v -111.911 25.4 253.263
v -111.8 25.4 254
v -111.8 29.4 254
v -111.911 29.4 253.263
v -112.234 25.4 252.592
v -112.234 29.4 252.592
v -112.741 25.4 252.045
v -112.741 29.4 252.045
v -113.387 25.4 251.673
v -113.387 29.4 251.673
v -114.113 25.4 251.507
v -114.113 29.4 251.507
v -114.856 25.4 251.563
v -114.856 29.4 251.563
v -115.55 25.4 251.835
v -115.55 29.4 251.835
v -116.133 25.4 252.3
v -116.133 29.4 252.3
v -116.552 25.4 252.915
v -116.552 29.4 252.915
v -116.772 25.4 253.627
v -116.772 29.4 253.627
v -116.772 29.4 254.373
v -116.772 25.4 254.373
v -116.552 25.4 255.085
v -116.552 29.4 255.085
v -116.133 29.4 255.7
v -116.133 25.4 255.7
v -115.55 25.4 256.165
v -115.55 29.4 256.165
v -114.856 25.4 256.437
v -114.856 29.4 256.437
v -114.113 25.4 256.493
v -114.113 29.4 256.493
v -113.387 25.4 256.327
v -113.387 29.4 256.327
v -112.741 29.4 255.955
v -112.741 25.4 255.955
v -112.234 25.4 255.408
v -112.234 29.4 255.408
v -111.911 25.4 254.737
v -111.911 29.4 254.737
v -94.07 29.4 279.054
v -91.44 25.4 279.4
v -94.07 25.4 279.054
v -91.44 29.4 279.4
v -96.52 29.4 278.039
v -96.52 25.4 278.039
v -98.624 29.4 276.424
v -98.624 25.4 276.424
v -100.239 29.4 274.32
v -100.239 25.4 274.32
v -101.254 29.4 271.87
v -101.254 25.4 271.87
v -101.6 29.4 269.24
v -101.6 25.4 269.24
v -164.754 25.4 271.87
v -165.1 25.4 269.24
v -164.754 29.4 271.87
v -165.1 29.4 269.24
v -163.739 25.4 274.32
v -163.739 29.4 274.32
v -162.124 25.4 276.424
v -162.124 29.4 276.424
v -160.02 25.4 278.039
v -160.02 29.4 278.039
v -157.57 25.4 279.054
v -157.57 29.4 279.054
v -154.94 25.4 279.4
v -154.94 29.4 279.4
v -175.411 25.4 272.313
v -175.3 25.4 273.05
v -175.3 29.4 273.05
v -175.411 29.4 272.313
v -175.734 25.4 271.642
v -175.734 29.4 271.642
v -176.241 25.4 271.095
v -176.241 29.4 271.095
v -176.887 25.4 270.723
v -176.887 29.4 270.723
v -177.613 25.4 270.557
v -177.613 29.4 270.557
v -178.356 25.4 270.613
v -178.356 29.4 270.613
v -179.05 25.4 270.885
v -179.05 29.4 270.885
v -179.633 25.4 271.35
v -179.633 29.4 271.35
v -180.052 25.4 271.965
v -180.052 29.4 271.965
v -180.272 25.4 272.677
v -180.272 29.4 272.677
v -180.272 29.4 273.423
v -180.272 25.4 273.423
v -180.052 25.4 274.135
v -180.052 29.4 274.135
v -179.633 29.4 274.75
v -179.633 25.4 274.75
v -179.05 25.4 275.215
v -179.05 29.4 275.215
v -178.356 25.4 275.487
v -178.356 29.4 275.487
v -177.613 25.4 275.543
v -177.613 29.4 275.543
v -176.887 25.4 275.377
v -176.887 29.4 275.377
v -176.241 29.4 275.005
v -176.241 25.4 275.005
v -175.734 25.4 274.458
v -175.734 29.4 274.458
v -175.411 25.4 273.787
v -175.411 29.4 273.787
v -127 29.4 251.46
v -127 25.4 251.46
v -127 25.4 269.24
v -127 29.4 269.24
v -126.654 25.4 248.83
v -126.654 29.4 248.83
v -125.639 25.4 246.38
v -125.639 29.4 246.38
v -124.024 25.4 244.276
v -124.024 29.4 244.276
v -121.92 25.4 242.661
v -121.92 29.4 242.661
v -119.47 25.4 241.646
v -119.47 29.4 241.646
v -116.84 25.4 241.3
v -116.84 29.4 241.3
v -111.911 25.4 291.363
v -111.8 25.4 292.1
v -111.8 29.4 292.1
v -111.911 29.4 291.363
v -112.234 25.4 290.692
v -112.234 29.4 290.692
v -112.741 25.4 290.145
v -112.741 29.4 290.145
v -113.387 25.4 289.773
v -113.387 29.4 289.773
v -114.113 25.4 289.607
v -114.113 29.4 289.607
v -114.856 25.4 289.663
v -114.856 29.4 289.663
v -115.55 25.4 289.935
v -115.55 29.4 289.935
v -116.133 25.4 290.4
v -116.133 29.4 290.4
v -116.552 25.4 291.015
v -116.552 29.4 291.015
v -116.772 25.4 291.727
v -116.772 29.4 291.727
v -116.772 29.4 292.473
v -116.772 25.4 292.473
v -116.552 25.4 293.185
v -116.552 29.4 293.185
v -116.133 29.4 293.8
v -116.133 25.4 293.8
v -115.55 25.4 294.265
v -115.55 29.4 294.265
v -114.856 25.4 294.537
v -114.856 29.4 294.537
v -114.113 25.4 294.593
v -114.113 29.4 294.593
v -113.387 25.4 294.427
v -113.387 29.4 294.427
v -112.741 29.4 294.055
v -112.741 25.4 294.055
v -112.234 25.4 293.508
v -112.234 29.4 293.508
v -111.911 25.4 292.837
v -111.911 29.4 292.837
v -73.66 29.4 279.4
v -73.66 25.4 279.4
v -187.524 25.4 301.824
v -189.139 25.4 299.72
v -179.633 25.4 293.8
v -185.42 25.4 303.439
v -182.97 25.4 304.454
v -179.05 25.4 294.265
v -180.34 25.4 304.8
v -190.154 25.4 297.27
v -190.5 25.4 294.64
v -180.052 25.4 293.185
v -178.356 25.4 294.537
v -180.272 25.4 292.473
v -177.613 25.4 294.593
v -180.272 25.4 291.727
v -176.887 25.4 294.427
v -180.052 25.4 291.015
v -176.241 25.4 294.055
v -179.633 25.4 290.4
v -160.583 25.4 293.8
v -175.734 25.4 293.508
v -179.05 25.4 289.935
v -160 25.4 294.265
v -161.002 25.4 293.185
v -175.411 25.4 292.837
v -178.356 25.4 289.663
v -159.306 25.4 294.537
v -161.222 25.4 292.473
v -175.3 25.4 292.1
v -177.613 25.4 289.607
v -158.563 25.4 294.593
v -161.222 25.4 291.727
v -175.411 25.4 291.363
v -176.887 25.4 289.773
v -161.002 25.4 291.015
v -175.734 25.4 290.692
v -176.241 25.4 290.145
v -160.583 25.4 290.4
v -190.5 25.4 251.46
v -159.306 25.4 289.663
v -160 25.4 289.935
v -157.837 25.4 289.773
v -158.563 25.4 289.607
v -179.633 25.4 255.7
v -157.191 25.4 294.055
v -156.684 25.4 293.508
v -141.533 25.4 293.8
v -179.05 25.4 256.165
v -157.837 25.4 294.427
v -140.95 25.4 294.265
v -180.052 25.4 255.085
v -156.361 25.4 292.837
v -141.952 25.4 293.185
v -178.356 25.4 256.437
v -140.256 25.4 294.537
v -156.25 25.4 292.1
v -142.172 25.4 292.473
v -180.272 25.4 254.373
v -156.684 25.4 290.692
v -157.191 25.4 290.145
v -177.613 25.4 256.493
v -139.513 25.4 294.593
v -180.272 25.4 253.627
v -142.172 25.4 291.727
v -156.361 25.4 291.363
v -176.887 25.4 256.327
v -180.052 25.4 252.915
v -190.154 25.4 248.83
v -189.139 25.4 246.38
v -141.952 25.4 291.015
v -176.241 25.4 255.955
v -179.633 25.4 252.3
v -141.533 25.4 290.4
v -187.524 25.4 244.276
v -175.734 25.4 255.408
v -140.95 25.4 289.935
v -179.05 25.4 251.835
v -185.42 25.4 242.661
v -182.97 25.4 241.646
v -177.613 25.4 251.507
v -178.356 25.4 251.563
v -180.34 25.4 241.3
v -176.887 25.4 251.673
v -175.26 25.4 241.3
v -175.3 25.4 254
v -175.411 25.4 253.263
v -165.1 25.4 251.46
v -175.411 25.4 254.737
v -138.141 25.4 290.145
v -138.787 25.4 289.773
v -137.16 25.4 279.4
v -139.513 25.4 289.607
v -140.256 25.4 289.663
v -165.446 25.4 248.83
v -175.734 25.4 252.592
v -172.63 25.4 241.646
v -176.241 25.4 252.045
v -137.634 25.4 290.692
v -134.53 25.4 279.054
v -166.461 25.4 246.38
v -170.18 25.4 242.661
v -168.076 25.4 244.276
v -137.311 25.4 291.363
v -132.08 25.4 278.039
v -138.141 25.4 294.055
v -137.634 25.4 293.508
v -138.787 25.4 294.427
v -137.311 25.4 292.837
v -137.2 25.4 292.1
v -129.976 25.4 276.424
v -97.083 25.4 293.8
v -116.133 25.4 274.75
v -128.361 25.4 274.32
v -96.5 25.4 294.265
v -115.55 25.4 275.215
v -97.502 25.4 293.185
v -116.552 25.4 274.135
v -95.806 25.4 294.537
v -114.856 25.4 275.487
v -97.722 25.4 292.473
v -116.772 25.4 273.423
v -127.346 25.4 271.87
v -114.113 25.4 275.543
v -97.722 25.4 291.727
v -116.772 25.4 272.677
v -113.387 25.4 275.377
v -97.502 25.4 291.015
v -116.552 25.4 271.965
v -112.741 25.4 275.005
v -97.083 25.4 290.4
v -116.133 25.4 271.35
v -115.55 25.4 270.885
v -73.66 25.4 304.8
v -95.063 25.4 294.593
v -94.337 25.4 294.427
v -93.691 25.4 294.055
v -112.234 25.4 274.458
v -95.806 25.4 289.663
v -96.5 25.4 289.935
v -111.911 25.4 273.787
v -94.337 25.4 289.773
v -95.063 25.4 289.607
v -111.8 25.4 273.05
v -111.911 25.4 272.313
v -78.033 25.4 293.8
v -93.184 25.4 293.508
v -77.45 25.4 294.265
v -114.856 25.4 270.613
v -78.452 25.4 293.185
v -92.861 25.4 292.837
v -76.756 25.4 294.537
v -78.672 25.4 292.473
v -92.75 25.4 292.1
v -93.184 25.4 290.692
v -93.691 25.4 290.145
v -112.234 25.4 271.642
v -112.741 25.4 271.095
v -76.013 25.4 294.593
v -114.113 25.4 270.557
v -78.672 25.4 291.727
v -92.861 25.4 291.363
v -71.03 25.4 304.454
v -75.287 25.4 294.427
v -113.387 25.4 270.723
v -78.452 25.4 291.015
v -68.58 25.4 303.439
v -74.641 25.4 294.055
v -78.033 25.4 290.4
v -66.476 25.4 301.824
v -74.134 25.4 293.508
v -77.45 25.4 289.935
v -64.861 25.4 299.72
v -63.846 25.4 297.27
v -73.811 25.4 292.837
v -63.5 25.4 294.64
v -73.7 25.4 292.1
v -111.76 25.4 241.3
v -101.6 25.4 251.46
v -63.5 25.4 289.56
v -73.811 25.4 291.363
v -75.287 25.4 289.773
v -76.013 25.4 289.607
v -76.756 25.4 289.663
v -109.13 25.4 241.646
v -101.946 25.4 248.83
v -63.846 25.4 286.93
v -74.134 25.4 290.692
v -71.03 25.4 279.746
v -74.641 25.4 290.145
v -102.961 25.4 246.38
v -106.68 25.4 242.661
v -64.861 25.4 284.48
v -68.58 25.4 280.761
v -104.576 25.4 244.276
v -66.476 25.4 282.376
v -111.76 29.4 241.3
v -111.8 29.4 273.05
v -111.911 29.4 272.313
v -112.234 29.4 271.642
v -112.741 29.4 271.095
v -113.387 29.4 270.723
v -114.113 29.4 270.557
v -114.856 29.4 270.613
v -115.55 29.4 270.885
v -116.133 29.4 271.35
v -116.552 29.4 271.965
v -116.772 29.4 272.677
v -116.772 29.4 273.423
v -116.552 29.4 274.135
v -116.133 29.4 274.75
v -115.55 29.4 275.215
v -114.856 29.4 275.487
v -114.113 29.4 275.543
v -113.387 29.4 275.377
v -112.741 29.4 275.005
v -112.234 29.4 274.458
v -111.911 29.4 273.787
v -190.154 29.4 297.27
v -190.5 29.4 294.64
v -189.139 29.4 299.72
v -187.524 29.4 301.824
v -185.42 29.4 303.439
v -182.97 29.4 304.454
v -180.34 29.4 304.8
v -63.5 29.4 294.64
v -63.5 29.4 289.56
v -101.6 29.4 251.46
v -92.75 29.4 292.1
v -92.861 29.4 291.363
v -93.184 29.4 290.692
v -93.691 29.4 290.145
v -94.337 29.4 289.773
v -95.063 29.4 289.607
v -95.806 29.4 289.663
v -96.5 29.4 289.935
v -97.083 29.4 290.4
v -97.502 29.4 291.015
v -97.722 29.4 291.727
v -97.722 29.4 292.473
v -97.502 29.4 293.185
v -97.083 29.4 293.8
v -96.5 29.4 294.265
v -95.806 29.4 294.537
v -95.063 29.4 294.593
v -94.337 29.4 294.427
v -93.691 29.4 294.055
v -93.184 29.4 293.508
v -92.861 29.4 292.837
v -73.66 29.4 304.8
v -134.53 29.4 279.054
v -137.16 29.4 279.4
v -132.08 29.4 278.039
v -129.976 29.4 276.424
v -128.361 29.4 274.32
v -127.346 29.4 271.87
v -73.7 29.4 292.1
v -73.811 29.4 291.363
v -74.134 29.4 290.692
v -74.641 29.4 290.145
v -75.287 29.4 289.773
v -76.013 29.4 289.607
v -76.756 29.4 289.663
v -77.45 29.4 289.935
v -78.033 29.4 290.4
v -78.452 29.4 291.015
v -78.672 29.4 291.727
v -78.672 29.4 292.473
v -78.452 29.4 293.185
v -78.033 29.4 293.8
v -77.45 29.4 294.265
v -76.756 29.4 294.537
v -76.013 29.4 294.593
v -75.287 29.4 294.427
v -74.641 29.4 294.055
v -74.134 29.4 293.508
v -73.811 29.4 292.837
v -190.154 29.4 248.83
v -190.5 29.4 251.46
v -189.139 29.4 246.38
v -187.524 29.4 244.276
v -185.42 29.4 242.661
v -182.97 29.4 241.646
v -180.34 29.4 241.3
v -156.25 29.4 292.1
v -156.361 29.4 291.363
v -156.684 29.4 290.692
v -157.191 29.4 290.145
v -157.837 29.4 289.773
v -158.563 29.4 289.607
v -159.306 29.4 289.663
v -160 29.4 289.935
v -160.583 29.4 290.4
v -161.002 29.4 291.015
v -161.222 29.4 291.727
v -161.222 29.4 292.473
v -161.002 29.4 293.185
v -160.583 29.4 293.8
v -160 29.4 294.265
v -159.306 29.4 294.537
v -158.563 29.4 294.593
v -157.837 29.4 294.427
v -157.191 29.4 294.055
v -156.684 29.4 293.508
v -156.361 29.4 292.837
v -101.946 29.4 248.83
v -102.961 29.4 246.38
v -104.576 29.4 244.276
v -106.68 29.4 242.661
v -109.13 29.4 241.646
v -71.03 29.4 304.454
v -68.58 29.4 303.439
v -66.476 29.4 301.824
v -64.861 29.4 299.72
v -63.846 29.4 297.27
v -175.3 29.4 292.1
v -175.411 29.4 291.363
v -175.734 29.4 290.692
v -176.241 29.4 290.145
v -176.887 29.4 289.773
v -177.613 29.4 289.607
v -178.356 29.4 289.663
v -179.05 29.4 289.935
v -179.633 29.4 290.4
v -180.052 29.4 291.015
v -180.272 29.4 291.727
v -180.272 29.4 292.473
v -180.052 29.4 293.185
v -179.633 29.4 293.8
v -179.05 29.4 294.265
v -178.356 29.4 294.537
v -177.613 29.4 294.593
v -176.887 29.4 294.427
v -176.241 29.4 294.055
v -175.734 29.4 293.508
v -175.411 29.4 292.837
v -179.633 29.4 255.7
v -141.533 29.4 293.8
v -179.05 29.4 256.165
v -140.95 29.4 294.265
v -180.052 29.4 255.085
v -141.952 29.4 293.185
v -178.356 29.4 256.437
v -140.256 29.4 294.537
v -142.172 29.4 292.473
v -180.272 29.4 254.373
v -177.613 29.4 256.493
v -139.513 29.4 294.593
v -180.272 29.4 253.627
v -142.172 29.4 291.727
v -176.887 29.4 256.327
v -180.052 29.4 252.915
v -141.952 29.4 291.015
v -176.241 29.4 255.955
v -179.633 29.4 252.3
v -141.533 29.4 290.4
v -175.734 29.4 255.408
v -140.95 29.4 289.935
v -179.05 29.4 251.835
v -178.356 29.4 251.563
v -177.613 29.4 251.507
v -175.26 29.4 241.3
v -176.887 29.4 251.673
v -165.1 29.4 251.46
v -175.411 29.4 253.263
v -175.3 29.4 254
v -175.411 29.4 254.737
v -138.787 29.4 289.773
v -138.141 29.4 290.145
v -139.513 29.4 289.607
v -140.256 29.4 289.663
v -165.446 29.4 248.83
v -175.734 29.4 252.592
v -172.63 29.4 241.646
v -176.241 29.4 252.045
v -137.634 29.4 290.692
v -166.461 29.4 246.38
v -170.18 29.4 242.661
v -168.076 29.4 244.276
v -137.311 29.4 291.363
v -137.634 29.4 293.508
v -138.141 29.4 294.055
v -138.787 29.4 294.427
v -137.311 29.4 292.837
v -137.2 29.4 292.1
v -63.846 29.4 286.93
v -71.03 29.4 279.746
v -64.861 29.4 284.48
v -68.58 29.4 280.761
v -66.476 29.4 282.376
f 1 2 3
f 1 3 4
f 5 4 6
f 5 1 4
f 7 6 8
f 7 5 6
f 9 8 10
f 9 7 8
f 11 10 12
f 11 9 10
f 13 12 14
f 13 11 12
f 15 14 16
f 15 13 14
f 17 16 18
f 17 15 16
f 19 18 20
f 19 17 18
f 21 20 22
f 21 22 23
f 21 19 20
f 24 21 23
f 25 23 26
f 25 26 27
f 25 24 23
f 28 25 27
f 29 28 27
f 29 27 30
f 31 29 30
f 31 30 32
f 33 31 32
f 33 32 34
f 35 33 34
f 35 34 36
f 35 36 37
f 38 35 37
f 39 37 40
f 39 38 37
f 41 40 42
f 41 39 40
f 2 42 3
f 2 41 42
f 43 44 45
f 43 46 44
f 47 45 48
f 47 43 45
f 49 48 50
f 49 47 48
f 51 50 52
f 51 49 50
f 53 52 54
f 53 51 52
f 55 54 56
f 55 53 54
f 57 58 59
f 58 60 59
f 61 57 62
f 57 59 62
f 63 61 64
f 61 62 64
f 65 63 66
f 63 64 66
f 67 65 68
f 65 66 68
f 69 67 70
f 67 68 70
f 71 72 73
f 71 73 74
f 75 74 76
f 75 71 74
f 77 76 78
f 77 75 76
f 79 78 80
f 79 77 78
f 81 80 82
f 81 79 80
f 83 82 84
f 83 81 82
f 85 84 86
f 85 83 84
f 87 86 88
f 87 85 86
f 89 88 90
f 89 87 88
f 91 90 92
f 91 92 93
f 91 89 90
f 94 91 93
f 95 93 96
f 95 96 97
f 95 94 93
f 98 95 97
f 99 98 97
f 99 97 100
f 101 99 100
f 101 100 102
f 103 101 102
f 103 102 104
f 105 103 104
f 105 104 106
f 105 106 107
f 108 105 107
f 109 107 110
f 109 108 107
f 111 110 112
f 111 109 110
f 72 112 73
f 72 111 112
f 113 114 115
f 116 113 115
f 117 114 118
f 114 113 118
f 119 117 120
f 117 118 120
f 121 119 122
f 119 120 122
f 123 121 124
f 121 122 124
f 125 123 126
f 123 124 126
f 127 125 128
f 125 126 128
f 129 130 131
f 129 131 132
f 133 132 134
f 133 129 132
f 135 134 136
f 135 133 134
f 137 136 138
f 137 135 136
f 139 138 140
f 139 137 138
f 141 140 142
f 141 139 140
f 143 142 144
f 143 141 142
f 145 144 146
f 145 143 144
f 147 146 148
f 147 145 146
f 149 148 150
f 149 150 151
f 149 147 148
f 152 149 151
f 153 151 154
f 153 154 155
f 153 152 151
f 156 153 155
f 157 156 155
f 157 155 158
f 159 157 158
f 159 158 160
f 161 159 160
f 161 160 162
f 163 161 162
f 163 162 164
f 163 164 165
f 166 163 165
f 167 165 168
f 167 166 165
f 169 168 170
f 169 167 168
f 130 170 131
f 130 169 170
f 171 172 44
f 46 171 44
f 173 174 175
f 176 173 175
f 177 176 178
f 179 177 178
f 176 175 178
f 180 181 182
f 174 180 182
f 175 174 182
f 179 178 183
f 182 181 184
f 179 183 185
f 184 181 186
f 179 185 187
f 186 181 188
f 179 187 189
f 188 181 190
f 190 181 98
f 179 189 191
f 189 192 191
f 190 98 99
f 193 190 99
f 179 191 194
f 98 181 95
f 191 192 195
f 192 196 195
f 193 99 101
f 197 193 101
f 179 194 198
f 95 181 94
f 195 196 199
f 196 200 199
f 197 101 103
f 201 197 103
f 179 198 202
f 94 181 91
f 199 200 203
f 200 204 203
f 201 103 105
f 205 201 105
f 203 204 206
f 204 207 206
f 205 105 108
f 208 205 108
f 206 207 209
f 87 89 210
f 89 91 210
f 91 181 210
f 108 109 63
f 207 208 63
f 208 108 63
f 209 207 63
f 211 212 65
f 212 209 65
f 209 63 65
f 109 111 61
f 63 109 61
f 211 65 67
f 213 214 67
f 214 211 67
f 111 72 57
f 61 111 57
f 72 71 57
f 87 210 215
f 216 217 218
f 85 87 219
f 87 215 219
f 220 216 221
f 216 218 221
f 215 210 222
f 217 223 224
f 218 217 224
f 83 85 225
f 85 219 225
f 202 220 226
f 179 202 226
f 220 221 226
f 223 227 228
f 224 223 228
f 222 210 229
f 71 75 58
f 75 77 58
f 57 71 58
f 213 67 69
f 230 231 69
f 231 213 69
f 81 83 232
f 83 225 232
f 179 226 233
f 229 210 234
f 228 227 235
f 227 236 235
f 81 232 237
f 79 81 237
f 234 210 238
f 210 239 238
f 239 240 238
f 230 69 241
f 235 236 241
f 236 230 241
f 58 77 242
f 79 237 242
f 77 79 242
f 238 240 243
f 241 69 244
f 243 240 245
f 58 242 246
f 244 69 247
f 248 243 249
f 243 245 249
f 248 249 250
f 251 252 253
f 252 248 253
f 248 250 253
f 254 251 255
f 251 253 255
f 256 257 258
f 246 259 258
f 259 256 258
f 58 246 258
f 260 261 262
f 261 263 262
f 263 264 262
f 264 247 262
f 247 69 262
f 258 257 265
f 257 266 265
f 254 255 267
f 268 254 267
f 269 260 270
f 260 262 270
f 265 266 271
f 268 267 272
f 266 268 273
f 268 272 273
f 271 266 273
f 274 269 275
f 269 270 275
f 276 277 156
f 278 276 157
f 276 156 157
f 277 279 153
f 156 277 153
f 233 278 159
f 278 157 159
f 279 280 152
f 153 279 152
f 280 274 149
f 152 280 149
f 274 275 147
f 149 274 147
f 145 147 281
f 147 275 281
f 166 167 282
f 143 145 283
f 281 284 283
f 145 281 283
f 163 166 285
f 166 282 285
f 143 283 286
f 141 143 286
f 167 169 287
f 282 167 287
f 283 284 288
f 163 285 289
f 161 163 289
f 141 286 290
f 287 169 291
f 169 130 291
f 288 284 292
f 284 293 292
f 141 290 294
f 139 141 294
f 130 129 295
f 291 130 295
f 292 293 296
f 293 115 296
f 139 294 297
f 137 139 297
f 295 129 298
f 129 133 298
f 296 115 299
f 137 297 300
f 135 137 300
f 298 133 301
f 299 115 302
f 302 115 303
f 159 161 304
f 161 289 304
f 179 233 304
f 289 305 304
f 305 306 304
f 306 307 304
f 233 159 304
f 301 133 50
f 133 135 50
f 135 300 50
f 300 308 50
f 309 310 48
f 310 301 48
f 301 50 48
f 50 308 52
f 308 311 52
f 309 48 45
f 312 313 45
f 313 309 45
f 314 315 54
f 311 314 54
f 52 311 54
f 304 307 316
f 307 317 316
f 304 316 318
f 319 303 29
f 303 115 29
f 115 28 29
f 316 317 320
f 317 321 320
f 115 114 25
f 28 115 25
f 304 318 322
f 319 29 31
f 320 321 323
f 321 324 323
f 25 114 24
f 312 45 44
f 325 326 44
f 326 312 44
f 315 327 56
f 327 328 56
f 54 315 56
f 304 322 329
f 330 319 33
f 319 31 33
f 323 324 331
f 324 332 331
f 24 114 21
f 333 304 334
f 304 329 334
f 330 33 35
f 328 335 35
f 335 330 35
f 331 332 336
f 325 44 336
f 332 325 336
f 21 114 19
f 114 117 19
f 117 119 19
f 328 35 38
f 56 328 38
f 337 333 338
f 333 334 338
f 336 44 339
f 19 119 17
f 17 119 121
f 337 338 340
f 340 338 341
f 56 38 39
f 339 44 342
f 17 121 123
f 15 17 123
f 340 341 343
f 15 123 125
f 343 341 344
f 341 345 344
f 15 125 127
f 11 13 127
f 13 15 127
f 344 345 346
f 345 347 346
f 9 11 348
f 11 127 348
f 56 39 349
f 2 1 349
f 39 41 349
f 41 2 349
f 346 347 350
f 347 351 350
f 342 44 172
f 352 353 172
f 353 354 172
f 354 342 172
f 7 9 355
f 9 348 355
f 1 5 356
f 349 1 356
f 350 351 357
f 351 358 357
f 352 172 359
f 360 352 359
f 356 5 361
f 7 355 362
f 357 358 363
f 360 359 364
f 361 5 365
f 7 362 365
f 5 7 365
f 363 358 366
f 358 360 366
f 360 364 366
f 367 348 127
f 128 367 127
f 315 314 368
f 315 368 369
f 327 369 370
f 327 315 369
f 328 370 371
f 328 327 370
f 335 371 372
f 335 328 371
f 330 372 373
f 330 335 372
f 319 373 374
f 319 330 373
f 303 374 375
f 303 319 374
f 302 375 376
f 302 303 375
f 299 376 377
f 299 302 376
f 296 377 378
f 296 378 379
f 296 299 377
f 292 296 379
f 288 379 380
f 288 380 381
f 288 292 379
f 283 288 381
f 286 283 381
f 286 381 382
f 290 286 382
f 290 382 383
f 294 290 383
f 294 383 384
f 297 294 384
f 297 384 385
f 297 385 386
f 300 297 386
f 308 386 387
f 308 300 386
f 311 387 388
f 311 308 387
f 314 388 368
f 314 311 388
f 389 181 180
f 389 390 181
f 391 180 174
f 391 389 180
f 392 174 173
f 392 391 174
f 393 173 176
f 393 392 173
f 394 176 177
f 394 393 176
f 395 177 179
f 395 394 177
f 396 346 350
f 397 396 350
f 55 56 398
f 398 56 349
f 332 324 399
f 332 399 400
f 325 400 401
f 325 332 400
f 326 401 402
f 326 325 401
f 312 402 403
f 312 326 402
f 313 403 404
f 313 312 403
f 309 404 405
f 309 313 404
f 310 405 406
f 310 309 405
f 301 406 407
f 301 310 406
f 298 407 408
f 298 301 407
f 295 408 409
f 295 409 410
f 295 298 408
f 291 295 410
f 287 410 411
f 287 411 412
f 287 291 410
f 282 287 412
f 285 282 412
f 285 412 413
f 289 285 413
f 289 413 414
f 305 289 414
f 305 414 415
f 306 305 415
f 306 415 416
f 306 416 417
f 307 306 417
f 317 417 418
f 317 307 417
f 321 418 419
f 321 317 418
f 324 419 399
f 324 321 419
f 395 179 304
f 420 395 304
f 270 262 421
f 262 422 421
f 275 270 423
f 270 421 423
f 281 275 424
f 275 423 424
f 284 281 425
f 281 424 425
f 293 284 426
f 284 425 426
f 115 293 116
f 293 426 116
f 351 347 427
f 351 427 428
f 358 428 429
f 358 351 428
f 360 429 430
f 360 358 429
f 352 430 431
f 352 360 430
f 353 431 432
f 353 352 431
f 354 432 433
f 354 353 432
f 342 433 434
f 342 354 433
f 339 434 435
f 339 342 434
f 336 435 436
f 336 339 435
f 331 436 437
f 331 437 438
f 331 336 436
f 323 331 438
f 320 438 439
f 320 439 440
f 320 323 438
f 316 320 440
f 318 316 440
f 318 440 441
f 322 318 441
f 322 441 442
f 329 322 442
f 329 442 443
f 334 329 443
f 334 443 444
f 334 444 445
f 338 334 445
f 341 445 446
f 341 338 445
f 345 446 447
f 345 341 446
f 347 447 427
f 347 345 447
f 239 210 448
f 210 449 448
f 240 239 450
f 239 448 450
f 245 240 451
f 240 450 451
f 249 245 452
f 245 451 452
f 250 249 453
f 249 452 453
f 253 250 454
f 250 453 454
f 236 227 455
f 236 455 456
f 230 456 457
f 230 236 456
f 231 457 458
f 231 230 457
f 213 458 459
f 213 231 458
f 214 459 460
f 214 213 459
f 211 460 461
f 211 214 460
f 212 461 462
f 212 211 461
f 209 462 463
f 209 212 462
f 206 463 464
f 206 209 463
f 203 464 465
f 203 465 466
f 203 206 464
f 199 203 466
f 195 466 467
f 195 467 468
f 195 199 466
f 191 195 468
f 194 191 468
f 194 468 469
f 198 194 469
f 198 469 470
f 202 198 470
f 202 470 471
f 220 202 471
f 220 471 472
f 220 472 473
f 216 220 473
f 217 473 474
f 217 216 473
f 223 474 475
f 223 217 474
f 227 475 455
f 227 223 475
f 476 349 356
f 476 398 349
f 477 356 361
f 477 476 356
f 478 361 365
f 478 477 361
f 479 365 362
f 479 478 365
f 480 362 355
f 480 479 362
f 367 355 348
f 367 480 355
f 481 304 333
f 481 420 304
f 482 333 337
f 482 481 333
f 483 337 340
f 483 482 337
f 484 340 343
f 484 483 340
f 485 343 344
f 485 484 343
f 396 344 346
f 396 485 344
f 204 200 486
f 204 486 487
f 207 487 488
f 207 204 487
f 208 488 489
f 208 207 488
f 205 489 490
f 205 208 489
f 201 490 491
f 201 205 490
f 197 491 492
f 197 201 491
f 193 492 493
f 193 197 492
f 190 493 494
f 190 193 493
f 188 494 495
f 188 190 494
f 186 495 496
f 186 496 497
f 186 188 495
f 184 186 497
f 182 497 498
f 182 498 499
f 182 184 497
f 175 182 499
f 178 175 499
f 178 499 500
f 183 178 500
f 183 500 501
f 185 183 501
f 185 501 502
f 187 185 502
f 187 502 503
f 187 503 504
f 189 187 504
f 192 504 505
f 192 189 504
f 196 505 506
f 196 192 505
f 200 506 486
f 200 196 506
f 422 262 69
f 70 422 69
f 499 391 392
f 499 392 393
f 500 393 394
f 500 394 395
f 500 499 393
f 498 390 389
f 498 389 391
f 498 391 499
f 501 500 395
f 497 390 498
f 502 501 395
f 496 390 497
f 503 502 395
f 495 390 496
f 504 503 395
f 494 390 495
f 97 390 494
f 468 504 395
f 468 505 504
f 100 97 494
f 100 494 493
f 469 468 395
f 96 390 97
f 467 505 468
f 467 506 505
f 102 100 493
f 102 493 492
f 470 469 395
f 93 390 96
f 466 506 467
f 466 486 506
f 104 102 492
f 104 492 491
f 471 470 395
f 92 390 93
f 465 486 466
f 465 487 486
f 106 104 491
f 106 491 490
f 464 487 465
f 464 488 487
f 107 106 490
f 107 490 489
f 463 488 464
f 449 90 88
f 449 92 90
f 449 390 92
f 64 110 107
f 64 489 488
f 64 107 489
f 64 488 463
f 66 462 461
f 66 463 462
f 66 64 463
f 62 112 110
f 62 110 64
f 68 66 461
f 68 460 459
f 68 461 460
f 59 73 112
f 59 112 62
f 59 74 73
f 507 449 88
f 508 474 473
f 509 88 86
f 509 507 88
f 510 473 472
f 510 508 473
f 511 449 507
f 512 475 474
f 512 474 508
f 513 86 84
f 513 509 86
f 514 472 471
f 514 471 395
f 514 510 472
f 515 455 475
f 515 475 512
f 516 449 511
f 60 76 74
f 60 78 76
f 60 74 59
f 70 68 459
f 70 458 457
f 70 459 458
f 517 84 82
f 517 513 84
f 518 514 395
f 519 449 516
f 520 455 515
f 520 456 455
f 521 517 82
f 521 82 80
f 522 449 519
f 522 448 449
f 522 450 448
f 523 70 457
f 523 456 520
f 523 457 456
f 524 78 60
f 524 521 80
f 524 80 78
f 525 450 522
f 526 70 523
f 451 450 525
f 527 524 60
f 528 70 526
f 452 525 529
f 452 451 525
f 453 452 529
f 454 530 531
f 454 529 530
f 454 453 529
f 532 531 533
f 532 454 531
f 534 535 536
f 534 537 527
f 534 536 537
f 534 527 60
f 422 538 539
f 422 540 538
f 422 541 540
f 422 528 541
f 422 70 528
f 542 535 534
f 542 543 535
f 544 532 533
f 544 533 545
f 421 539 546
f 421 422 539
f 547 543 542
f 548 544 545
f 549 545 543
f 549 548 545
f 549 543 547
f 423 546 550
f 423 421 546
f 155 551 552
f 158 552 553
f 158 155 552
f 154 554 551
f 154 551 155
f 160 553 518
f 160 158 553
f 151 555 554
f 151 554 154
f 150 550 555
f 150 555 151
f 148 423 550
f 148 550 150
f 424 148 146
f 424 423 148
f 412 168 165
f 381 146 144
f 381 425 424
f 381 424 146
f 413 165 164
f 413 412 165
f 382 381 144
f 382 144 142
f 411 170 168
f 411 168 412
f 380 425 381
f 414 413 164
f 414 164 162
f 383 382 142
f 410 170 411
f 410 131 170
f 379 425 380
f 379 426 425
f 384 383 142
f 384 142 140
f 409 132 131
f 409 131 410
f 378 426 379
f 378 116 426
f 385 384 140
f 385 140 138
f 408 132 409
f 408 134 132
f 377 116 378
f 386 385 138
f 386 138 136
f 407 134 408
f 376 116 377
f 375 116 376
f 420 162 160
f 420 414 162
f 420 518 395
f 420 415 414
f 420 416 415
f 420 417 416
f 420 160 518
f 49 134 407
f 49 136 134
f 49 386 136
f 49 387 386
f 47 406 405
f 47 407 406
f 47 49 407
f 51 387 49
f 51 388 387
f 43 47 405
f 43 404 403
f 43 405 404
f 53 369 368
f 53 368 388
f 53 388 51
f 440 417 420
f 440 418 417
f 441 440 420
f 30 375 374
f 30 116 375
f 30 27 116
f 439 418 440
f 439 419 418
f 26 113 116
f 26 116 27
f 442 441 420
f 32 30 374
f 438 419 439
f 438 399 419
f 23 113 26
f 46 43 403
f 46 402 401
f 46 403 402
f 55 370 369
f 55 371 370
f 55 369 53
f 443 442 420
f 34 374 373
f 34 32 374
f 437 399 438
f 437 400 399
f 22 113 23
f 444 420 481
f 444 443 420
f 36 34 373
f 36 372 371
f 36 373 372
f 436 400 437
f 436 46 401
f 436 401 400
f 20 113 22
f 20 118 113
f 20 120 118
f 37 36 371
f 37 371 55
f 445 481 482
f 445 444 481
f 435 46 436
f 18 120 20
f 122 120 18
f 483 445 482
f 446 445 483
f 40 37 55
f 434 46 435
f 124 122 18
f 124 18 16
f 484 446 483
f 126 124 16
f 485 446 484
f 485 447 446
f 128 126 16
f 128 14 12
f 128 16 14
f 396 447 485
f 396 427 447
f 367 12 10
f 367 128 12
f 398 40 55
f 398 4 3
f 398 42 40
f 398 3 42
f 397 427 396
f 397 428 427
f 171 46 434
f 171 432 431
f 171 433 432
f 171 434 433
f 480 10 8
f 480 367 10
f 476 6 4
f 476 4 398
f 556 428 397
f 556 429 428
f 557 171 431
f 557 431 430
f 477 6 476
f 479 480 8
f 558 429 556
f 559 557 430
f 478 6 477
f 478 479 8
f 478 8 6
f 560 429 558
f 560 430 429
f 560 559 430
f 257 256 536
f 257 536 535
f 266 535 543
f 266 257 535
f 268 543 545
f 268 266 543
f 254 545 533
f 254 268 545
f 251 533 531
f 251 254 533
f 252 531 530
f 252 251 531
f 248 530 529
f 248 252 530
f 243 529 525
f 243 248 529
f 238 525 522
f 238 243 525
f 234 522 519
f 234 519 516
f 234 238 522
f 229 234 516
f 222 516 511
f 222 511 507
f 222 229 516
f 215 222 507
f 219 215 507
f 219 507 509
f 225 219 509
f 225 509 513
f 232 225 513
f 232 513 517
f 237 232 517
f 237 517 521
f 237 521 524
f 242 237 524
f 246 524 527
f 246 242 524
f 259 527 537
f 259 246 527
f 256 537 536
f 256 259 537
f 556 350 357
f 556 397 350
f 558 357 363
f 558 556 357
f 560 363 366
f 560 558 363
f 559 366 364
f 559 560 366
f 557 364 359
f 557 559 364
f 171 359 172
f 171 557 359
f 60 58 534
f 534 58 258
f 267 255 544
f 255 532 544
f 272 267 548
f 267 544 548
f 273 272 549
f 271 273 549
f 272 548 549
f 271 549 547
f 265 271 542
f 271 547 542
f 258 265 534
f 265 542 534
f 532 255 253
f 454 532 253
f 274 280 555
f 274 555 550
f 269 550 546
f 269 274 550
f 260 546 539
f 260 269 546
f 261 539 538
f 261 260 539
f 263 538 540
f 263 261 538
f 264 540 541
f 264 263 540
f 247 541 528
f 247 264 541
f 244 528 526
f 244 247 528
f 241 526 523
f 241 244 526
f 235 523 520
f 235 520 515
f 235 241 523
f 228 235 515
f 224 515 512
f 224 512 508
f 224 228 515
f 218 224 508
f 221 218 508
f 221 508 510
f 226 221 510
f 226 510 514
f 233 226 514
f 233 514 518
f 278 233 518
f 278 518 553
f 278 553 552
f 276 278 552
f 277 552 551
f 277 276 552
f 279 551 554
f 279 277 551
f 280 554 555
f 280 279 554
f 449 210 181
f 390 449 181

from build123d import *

# Parameters (mm, degrees)
SKETCH1_R           = 2.5
BOSS_EXTRUDE1_DEPTH = 4
FILLET1_R           = 10.16


with BuildPart() as part:
    # Sketch1 → Boss-Extrude1 (new body)
    with BuildSketch(Plane(origin=(0, 25.4, 0), x_dir=(1, 0, 0), z_dir=(0, 1, 0))):
        Polygon((-190.5, -241.3), (-190.5, -279.4), (-190.5, -304.8), (-63.5, -304.8), (-63.5, -279.4), (-101.6, -279.4), (-101.6, -241.3), (-127, -241.3), (-127, -279.4), (-165.1, -279.4), (-165.1, -241.3), align=None)
        with Locations((-114.3, -292.1)):
            Circle(SKETCH1_R, mode=Mode.SUBTRACT)
        with Locations((-177.8, -292.1)):
            Circle(SKETCH1_R, mode=Mode.SUBTRACT)
        with Locations((-158.75, -292.1)):
            Circle(SKETCH1_R, mode=Mode.SUBTRACT)
        with Locations((-95.25, -292.1)):
            Circle(SKETCH1_R, mode=Mode.SUBTRACT)
        with Locations((-139.7, -292.1)):
            Circle(SKETCH1_R, mode=Mode.SUBTRACT)
        with Locations((-76.2, -292.1)):
            Circle(SKETCH1_R, mode=Mode.SUBTRACT)
        with Locations((-114.3, -273.05)):
            Circle(SKETCH1_R, mode=Mode.SUBTRACT)
        with Locations((-177.8, -273.05)):
            Circle(SKETCH1_R, mode=Mode.SUBTRACT)
        with Locations((-114.3, -254)):
            Circle(SKETCH1_R, mode=Mode.SUBTRACT)
        with Locations((-177.8, -254)):
            Circle(SKETCH1_R, mode=Mode.SUBTRACT)
    extrude(amount=BOSS_EXTRUDE1_DEPTH)

    # Fillet1
    fillet1_edges = [part.edges().sort_by_distance(p)[0] for p in [
        (-190.5, 27.4, 304.8),
        (-190.5, 27.4, 241.3),
        (-165.1, 27.4, 241.3),
        (-165.1, 27.4, 279.4),
        (-127, 27.4, 279.4),
        (-127, 27.4, 241.3),
        (-101.6, 27.4, 241.3),
        (-101.6, 27.4, 279.4),
        (-63.5, 27.4, 279.4),
        (-63.5, 27.4, 304.8),
    ]]
    fillet(fillet1_edges, radius=FILLET1_R)


solid = part.part
